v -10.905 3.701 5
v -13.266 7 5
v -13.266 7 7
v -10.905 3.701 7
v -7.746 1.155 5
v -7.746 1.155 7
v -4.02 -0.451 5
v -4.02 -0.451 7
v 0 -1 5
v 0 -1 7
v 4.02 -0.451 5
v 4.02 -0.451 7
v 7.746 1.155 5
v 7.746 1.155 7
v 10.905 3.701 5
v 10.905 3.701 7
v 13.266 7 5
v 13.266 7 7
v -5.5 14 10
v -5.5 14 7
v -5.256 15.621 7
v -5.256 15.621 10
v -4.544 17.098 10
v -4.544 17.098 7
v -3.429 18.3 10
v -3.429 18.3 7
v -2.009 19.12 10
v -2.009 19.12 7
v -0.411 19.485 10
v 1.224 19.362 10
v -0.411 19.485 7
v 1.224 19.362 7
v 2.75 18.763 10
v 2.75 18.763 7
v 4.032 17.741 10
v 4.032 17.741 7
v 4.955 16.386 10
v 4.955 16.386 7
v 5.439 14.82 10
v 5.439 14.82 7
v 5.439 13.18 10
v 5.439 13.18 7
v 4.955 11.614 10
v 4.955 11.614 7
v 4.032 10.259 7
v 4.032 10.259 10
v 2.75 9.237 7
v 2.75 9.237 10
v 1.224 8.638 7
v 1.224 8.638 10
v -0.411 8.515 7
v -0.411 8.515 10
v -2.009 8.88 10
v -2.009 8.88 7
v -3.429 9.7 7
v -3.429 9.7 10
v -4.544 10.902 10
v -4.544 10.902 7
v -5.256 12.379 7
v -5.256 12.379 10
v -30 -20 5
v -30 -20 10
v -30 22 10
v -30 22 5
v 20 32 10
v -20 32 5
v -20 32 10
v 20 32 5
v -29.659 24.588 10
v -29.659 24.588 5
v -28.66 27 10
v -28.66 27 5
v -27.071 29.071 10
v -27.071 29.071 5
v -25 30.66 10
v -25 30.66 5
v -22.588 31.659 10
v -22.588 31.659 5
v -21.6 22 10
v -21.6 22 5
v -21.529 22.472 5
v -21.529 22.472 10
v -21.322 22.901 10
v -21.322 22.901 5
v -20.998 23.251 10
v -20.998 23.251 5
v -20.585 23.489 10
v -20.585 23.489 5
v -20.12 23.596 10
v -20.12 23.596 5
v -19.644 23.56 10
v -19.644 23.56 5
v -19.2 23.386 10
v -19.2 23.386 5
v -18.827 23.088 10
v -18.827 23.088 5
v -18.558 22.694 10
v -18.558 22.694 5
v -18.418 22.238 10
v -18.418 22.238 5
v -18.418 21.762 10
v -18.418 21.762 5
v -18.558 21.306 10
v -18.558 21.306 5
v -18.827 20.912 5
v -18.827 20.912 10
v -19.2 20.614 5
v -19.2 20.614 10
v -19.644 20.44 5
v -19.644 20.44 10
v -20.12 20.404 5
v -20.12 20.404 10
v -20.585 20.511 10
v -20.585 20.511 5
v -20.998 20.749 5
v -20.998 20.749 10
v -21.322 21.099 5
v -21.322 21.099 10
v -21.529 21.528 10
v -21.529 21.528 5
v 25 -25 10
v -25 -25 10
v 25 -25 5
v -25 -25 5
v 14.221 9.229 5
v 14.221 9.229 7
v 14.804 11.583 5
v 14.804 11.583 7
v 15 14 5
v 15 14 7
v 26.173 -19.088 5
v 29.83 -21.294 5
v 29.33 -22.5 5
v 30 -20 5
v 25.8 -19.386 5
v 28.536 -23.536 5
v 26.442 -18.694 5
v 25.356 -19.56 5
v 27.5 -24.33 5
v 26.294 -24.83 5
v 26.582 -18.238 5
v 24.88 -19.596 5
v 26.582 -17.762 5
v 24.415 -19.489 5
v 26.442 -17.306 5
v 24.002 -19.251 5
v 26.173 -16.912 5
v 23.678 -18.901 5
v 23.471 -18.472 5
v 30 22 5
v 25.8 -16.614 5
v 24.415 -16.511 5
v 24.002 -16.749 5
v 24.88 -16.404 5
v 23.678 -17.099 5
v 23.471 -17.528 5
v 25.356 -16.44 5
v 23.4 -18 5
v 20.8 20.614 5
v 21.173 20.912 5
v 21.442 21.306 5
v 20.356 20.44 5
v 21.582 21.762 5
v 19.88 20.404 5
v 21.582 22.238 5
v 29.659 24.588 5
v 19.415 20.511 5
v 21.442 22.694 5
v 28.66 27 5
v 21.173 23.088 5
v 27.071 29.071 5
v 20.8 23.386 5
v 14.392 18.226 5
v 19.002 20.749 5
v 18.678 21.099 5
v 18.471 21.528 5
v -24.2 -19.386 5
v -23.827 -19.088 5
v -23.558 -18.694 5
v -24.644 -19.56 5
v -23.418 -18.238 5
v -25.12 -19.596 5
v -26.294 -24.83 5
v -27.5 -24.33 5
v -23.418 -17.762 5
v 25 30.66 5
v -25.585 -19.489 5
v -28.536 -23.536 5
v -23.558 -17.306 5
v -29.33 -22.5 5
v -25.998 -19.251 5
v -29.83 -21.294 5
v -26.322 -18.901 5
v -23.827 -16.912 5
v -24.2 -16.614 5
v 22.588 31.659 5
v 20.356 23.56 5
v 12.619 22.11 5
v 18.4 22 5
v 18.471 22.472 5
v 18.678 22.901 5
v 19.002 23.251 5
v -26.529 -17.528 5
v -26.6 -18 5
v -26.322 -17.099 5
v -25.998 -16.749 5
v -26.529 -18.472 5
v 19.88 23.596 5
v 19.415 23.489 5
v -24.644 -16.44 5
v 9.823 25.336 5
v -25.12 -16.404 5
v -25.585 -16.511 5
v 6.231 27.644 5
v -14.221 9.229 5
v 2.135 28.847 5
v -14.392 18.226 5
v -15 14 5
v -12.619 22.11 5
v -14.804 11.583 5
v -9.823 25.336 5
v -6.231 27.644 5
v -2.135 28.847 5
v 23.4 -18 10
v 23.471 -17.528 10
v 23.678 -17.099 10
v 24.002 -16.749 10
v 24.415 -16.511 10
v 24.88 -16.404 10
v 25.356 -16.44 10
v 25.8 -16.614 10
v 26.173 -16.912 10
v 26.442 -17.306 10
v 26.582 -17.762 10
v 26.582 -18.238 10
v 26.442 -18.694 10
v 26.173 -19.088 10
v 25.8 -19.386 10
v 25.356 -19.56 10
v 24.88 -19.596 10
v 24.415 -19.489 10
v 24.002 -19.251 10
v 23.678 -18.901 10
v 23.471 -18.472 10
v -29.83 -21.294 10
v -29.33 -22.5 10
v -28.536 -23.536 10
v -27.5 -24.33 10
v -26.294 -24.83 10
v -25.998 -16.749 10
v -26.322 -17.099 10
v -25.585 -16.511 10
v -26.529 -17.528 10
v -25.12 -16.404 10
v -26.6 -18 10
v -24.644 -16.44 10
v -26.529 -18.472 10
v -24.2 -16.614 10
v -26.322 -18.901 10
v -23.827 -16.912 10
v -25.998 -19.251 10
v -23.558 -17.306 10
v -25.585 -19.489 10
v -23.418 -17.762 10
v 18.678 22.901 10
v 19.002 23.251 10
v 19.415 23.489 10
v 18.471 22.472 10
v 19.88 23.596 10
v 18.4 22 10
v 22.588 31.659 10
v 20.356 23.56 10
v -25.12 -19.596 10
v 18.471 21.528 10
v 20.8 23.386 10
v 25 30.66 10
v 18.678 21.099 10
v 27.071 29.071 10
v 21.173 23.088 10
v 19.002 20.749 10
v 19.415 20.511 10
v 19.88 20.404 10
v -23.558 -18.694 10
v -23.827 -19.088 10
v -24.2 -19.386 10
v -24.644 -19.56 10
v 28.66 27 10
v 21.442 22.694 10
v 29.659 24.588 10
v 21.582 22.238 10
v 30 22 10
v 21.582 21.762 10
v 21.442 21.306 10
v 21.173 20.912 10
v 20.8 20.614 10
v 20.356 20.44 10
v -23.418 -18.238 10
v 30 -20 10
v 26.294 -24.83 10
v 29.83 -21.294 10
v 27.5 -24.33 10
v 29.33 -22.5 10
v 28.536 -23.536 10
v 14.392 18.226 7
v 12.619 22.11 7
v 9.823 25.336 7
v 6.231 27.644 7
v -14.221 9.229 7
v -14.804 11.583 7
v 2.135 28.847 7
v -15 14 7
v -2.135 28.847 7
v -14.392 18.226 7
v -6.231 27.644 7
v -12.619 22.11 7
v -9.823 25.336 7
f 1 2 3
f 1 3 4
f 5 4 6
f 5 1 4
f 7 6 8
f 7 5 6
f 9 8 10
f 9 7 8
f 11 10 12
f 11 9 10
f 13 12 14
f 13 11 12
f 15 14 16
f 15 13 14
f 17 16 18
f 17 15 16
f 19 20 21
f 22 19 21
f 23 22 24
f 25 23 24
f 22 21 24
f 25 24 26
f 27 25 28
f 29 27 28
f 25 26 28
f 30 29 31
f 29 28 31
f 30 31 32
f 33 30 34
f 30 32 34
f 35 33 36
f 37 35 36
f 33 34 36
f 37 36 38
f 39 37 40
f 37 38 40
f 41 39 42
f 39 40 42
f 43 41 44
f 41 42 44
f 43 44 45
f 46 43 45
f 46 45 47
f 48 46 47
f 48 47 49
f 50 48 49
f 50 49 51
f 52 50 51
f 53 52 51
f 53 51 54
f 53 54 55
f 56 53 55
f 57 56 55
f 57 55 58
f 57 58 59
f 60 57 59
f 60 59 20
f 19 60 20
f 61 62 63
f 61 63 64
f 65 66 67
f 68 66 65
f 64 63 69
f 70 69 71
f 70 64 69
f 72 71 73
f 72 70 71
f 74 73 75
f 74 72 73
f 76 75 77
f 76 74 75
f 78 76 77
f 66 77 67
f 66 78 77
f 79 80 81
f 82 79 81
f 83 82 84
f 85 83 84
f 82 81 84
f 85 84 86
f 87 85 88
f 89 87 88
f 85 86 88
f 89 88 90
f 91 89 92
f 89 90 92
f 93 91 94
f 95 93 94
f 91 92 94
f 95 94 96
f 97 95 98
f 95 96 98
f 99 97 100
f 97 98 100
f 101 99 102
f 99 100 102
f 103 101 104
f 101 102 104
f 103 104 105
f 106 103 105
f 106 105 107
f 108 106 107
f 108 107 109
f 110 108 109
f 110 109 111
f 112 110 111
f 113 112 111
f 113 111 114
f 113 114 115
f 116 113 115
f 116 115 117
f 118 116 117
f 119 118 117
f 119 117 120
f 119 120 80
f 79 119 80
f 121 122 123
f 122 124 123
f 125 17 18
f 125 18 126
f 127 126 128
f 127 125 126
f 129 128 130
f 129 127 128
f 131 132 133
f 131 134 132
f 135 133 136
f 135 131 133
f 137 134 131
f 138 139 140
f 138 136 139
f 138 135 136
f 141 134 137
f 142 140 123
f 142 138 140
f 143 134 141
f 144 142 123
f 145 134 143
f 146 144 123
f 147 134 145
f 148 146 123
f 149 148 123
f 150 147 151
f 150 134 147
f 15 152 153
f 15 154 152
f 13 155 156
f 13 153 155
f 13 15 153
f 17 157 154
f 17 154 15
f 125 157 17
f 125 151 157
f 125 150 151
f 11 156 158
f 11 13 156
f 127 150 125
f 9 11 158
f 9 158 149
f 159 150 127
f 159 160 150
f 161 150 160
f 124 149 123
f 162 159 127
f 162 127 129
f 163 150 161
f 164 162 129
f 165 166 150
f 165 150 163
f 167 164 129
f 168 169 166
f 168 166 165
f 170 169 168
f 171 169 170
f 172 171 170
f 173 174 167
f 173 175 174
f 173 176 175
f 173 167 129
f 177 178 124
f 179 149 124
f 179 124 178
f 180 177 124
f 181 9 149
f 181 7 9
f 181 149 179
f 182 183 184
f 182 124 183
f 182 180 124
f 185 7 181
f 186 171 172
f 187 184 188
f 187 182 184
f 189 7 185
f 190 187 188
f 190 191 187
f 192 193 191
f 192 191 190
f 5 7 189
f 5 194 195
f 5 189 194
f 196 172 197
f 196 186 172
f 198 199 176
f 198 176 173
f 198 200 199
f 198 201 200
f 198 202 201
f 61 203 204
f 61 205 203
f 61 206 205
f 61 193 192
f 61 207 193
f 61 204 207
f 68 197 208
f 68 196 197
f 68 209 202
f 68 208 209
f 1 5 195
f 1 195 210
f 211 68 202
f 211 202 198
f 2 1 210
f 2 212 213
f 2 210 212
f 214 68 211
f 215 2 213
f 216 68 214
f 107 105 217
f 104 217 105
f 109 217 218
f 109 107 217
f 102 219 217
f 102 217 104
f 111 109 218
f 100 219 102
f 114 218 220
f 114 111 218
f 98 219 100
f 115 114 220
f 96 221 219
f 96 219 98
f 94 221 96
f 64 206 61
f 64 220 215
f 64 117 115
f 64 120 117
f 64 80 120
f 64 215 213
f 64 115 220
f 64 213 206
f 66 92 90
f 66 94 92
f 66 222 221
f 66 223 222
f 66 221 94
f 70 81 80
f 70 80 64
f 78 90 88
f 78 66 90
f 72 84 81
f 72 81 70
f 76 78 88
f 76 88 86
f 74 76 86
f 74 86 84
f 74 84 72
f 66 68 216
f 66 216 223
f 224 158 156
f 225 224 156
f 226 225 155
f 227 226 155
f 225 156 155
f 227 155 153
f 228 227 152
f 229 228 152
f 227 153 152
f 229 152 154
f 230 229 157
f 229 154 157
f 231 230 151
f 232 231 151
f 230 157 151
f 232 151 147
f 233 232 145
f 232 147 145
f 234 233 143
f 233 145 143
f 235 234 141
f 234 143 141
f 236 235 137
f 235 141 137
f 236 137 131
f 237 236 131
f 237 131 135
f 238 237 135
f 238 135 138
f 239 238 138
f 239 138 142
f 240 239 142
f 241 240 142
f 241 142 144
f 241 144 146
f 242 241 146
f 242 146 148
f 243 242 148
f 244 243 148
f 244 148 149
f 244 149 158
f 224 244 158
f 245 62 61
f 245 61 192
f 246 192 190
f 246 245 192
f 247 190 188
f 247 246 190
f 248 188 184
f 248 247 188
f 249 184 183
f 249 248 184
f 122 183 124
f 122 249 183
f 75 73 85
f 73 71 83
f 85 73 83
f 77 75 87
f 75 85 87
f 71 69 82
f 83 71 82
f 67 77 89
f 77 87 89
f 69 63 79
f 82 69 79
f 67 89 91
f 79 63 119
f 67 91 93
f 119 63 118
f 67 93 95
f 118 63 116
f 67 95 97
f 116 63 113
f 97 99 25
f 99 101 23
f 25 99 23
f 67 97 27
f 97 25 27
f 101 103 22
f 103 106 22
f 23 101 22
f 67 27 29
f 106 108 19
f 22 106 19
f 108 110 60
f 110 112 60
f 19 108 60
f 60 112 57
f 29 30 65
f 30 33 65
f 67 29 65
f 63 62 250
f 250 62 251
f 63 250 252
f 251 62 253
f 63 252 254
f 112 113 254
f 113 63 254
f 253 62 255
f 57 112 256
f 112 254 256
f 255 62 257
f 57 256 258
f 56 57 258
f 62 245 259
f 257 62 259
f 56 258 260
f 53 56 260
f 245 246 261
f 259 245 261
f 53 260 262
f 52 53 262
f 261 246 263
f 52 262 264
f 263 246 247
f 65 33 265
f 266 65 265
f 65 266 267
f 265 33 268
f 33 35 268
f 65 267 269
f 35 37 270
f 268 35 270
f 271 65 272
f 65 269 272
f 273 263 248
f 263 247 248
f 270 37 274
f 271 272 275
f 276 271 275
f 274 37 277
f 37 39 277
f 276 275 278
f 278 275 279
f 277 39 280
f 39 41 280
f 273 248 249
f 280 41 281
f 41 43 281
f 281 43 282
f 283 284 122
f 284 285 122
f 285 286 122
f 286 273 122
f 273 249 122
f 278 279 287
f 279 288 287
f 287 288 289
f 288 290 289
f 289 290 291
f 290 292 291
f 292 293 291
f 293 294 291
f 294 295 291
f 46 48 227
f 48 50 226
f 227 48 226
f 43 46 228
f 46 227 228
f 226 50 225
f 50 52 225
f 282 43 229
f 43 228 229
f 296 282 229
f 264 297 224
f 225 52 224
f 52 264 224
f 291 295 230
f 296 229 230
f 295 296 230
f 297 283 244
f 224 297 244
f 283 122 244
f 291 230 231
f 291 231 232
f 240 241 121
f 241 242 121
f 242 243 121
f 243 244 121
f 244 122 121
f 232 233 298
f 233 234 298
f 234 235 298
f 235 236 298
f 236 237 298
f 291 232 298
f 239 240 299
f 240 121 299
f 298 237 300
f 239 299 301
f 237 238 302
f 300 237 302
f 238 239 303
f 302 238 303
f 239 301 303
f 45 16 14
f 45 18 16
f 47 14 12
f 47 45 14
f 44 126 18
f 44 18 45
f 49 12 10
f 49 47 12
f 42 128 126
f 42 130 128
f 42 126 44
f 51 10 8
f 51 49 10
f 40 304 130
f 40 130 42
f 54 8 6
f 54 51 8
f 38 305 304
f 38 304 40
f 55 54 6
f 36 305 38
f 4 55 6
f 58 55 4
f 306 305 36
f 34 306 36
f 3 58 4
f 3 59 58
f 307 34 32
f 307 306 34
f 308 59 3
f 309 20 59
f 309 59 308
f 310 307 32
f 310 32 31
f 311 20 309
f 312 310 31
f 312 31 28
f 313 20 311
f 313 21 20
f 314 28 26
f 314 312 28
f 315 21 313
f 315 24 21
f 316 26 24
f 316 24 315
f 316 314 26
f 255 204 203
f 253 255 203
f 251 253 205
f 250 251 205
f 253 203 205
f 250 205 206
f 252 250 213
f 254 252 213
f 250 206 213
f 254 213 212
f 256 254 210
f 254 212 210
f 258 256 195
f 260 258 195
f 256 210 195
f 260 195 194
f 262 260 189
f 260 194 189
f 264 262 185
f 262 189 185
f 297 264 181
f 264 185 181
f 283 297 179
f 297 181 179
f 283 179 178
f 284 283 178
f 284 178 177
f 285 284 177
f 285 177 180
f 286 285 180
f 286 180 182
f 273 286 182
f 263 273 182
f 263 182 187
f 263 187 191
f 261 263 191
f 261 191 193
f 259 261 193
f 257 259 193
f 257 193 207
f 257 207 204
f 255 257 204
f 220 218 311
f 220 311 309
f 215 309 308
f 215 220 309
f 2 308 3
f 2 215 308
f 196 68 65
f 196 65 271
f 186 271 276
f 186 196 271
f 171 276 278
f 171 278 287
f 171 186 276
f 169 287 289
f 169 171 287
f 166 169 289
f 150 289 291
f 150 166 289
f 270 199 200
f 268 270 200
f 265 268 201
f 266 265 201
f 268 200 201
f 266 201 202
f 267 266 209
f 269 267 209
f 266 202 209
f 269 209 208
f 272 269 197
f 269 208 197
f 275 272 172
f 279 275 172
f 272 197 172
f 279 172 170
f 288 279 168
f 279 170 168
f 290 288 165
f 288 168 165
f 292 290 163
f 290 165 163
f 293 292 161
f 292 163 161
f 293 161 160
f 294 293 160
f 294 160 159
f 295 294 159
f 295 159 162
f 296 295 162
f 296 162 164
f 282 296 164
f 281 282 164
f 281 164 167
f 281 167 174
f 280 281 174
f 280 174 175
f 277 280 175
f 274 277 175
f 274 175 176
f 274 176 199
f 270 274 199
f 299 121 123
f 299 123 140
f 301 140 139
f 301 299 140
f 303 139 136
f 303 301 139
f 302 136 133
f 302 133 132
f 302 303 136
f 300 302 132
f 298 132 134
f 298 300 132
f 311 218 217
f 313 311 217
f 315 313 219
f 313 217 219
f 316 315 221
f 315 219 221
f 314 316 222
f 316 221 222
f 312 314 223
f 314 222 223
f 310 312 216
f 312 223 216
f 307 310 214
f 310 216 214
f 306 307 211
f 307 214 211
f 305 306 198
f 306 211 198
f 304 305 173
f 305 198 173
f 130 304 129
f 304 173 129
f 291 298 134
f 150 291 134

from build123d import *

# Parameters (mm, degrees)
SKETCH_1_W          = 60
SKETCH_1_H          = 50
SKETCH_1_R          = 15
EXTRUDE_5_DEPTH     = 5
SKETCH_4_W          = 60
SKETCH_4_H          = 50
SKETCH_4_R          = 5.5
EXTRUDE_6_DEPTH     = 5
SKETCH_5_R          = 1.6
CUT_EXTRUDE_1_DEPTH = 10
SKETCH_6_W          = 60
SKETCH_6_H          = 10
EXTRUDE_7_DEPTH     = 7
FILLET_3_R          = 10
FILLET_5_R          = 10
FILLET_6_R          = 5
FILLET_7_R          = 5
SKETCH_7_W          = 62.929868023
SKETCH_7_H          = 59.60365164
CUT_EXTRUDE_2_DEPTH = 5
SKETCH_8_R          = 15
CUT_EXTRUDE_3_DEPTH = 2
SKETCH_9_R          = 15
CUT_EXTRUDE_4_DEPTH = 2
SKETCH_10_R         = 5.5
CUT_EXTRUDE_6_DEPTH = 44.965895874
SKETCH_11_R         = 5.5
EXTRUDE_8_DEPTH     = 3
EXTRUDE_START       = 2
EXTRUDE_9_DEPTH     = 2


with BuildPart() as part:
    # 草图1 → 凸台-拉伸5 (new body)
    with BuildSketch(Plane.XY):
        Rectangle(SKETCH_1_W, SKETCH_1_H)
        Circle(SKETCH_1_R, mode=Mode.SUBTRACT)
    extrude(amount=EXTRUDE_5_DEPTH)

    # 草图4 → 凸台-拉伸6 (add)
    with BuildSketch(Plane.XY.offset(5)):
        Rectangle(SKETCH_4_W, SKETCH_4_H)
        Circle(SKETCH_4_R, mode=Mode.SUBTRACT)
    extrude(amount=EXTRUDE_6_DEPTH)

    # 草图5 → 切除-拉伸1 (cut)
    with BuildSketch(Plane(origin=(0, 0, 0), x_dir=(-1, 0, 0), z_dir=(0, 0, -1))):
        with Locations((-20, 22)):
            Circle(SKETCH_5_R)
        with Locations((-25, -18)):
            Circle(SKETCH_5_R)
        with Locations((20, 22)):
            Circle(SKETCH_5_R)
        with Locations((25, -18)):
            Circle(SKETCH_5_R)
    extrude(amount=-CUT_EXTRUDE_1_DEPTH, mode=Mode.SUBTRACT)

    # 草图6 → 凸台-拉伸7 (add)
    with BuildSketch(Plane(origin=(0, 25, 0), x_dir=(1, 0, 0), z_dir=(0, 1, 0))):
        with Locations((0, -5)):
            Rectangle(SKETCH_6_W, SKETCH_6_H)
    extrude(amount=EXTRUDE_7_DEPTH)

    # 圆角3
    fillet_3_edges = [part.edges().sort_by_distance(p)[0] for p in [
        (-30, 32, 5),
    ]]
    fillet(fillet_3_edges, radius=FILLET_3_R)

    # 圆角5
    fillet_5_edges = [part.edges().sort_by_distance(p)[0] for p in [
        (30, 32, 5),
    ]]
    fillet(fillet_5_edges, radius=FILLET_5_R)

    # 圆角6
    fillet_6_edges = [part.edges().sort_by_distance(p)[0] for p in [
        (-30, -25, 5),
    ]]
    fillet(fillet_6_edges, radius=FILLET_6_R)

    # 圆角7
    fillet_7_edges = [part.edges().sort_by_distance(p)[0] for p in [
        (30, -25, 5),
    ]]
    fillet(fillet_7_edges, radius=FILLET_7_R)

    # 草图7 → 切除-拉伸2 (cut)
    with BuildSketch(Plane(origin=(0, 0, 0), x_dir=(-1, 0, 0), z_dir=(0, 0, -1))):
        with Locations((0.697432467, 2.50749995)):
            Rectangle(SKETCH_7_W, SKETCH_7_H)
    extrude(amount=-CUT_EXTRUDE_2_DEPTH, mode=Mode.SUBTRACT)

    # 草图8 → 切除-拉伸3 (cut)
    with BuildSketch(Plane(origin=(0, 0, 5), x_dir=(-1, 0, 0), z_dir=(0, 0, -1))):
        Circle(SKETCH_8_R)
    extrude(amount=-CUT_EXTRUDE_3_DEPTH, mode=Mode.SUBTRACT)

    # 草图9 → 切除-拉伸4 (cut)
    with BuildSketch(Plane(origin=(0, 0, 5), x_dir=(-1, 0, 0), z_dir=(0, 0, -1))):
        with Locations((0, 14)):
            Circle(SKETCH_9_R)
        Circle(SKETCH_9_R)
        with BuildLine():
            ThreePointArc((-13.266499161, 7), (-14.560176637, 10.394274513), (-15, 14))
            Line((-15, 14), (-15, 0))
            ThreePointArc((-15, 0), (-14.560176637, 3.605725487), (-13.266499161, 7))
        make_face()
        with BuildLine():
            Line((15, 0), (15, 14))
            ThreePointArc((15, 14), (14.560176637, 10.394274513), (13.266499161, 7))
            ThreePointArc((13.266499161, 7), (14.560176637, 3.605725487), (15, 0))
        make_face()
    extrude(amount=-CUT_EXTRUDE_4_DEPTH, mode=Mode.SUBTRACT)

    # 草图10 → 切除-拉伸6 (cut, through all)
    with BuildSketch(Plane(origin=(0, 0, 7), x_dir=(-1, 0, 0), z_dir=(0, 0, -1))):
        with Locations((0, 14)):
            Circle(SKETCH_10_R)
    extrude(amount=-CUT_EXTRUDE_6_DEPTH, mode=Mode.SUBTRACT)

    # 草图11 → 凸台-拉伸8 (add)
    with BuildSketch(Plane(origin=(0, 0, 7), x_dir=(-1, 0, 0), z_dir=(0, 0, -1))):
        Circle(SKETCH_11_R)
    extrude(amount=-EXTRUDE_8_DEPTH)

    # 草图12 → 凸台-拉伸9 (add)
    with BuildSketch(Plane(origin=(0, 0, 7), x_dir=(-1, 0, 0), z_dir=(0, 0, -1)).offset(EXTRUDE_START)):
        with BuildLine():
            ThreePointArc((-13.266499161, 7), (-14.560176637, 3.605725487), (-15, 0))
            ThreePointArc((-15, 0), (0, -15), (15, 0))
            ThreePointArc((15, 0), (14.560176637, 3.605725487), (13.266499161, 7))
            ThreePointArc((13.266499161, 7), (0, -1), (-13.266499161, 7))
        make_face()
        with BuildLine():
            ThreePointArc((-13.266499161, 7), (-14.560176637, 10.394274513), (-15, 14))
            Line((-15, 14), (-15, 0))
            ThreePointArc((-15, 0), (-14.560176637, 3.605725487), (-13.266499161, 7))
        make_face()
        with BuildLine():
            Line((15, 0), (15, 14))
            ThreePointArc((15, 14), (14.560176637, 10.394274513), (13.266499161, 7))
            ThreePointArc((13.266499161, 7), (14.560176637, 3.605725487), (15, 0))
        make_face()
    extrude(amount=-EXTRUDE_9_DEPTH)


solid = part.part
